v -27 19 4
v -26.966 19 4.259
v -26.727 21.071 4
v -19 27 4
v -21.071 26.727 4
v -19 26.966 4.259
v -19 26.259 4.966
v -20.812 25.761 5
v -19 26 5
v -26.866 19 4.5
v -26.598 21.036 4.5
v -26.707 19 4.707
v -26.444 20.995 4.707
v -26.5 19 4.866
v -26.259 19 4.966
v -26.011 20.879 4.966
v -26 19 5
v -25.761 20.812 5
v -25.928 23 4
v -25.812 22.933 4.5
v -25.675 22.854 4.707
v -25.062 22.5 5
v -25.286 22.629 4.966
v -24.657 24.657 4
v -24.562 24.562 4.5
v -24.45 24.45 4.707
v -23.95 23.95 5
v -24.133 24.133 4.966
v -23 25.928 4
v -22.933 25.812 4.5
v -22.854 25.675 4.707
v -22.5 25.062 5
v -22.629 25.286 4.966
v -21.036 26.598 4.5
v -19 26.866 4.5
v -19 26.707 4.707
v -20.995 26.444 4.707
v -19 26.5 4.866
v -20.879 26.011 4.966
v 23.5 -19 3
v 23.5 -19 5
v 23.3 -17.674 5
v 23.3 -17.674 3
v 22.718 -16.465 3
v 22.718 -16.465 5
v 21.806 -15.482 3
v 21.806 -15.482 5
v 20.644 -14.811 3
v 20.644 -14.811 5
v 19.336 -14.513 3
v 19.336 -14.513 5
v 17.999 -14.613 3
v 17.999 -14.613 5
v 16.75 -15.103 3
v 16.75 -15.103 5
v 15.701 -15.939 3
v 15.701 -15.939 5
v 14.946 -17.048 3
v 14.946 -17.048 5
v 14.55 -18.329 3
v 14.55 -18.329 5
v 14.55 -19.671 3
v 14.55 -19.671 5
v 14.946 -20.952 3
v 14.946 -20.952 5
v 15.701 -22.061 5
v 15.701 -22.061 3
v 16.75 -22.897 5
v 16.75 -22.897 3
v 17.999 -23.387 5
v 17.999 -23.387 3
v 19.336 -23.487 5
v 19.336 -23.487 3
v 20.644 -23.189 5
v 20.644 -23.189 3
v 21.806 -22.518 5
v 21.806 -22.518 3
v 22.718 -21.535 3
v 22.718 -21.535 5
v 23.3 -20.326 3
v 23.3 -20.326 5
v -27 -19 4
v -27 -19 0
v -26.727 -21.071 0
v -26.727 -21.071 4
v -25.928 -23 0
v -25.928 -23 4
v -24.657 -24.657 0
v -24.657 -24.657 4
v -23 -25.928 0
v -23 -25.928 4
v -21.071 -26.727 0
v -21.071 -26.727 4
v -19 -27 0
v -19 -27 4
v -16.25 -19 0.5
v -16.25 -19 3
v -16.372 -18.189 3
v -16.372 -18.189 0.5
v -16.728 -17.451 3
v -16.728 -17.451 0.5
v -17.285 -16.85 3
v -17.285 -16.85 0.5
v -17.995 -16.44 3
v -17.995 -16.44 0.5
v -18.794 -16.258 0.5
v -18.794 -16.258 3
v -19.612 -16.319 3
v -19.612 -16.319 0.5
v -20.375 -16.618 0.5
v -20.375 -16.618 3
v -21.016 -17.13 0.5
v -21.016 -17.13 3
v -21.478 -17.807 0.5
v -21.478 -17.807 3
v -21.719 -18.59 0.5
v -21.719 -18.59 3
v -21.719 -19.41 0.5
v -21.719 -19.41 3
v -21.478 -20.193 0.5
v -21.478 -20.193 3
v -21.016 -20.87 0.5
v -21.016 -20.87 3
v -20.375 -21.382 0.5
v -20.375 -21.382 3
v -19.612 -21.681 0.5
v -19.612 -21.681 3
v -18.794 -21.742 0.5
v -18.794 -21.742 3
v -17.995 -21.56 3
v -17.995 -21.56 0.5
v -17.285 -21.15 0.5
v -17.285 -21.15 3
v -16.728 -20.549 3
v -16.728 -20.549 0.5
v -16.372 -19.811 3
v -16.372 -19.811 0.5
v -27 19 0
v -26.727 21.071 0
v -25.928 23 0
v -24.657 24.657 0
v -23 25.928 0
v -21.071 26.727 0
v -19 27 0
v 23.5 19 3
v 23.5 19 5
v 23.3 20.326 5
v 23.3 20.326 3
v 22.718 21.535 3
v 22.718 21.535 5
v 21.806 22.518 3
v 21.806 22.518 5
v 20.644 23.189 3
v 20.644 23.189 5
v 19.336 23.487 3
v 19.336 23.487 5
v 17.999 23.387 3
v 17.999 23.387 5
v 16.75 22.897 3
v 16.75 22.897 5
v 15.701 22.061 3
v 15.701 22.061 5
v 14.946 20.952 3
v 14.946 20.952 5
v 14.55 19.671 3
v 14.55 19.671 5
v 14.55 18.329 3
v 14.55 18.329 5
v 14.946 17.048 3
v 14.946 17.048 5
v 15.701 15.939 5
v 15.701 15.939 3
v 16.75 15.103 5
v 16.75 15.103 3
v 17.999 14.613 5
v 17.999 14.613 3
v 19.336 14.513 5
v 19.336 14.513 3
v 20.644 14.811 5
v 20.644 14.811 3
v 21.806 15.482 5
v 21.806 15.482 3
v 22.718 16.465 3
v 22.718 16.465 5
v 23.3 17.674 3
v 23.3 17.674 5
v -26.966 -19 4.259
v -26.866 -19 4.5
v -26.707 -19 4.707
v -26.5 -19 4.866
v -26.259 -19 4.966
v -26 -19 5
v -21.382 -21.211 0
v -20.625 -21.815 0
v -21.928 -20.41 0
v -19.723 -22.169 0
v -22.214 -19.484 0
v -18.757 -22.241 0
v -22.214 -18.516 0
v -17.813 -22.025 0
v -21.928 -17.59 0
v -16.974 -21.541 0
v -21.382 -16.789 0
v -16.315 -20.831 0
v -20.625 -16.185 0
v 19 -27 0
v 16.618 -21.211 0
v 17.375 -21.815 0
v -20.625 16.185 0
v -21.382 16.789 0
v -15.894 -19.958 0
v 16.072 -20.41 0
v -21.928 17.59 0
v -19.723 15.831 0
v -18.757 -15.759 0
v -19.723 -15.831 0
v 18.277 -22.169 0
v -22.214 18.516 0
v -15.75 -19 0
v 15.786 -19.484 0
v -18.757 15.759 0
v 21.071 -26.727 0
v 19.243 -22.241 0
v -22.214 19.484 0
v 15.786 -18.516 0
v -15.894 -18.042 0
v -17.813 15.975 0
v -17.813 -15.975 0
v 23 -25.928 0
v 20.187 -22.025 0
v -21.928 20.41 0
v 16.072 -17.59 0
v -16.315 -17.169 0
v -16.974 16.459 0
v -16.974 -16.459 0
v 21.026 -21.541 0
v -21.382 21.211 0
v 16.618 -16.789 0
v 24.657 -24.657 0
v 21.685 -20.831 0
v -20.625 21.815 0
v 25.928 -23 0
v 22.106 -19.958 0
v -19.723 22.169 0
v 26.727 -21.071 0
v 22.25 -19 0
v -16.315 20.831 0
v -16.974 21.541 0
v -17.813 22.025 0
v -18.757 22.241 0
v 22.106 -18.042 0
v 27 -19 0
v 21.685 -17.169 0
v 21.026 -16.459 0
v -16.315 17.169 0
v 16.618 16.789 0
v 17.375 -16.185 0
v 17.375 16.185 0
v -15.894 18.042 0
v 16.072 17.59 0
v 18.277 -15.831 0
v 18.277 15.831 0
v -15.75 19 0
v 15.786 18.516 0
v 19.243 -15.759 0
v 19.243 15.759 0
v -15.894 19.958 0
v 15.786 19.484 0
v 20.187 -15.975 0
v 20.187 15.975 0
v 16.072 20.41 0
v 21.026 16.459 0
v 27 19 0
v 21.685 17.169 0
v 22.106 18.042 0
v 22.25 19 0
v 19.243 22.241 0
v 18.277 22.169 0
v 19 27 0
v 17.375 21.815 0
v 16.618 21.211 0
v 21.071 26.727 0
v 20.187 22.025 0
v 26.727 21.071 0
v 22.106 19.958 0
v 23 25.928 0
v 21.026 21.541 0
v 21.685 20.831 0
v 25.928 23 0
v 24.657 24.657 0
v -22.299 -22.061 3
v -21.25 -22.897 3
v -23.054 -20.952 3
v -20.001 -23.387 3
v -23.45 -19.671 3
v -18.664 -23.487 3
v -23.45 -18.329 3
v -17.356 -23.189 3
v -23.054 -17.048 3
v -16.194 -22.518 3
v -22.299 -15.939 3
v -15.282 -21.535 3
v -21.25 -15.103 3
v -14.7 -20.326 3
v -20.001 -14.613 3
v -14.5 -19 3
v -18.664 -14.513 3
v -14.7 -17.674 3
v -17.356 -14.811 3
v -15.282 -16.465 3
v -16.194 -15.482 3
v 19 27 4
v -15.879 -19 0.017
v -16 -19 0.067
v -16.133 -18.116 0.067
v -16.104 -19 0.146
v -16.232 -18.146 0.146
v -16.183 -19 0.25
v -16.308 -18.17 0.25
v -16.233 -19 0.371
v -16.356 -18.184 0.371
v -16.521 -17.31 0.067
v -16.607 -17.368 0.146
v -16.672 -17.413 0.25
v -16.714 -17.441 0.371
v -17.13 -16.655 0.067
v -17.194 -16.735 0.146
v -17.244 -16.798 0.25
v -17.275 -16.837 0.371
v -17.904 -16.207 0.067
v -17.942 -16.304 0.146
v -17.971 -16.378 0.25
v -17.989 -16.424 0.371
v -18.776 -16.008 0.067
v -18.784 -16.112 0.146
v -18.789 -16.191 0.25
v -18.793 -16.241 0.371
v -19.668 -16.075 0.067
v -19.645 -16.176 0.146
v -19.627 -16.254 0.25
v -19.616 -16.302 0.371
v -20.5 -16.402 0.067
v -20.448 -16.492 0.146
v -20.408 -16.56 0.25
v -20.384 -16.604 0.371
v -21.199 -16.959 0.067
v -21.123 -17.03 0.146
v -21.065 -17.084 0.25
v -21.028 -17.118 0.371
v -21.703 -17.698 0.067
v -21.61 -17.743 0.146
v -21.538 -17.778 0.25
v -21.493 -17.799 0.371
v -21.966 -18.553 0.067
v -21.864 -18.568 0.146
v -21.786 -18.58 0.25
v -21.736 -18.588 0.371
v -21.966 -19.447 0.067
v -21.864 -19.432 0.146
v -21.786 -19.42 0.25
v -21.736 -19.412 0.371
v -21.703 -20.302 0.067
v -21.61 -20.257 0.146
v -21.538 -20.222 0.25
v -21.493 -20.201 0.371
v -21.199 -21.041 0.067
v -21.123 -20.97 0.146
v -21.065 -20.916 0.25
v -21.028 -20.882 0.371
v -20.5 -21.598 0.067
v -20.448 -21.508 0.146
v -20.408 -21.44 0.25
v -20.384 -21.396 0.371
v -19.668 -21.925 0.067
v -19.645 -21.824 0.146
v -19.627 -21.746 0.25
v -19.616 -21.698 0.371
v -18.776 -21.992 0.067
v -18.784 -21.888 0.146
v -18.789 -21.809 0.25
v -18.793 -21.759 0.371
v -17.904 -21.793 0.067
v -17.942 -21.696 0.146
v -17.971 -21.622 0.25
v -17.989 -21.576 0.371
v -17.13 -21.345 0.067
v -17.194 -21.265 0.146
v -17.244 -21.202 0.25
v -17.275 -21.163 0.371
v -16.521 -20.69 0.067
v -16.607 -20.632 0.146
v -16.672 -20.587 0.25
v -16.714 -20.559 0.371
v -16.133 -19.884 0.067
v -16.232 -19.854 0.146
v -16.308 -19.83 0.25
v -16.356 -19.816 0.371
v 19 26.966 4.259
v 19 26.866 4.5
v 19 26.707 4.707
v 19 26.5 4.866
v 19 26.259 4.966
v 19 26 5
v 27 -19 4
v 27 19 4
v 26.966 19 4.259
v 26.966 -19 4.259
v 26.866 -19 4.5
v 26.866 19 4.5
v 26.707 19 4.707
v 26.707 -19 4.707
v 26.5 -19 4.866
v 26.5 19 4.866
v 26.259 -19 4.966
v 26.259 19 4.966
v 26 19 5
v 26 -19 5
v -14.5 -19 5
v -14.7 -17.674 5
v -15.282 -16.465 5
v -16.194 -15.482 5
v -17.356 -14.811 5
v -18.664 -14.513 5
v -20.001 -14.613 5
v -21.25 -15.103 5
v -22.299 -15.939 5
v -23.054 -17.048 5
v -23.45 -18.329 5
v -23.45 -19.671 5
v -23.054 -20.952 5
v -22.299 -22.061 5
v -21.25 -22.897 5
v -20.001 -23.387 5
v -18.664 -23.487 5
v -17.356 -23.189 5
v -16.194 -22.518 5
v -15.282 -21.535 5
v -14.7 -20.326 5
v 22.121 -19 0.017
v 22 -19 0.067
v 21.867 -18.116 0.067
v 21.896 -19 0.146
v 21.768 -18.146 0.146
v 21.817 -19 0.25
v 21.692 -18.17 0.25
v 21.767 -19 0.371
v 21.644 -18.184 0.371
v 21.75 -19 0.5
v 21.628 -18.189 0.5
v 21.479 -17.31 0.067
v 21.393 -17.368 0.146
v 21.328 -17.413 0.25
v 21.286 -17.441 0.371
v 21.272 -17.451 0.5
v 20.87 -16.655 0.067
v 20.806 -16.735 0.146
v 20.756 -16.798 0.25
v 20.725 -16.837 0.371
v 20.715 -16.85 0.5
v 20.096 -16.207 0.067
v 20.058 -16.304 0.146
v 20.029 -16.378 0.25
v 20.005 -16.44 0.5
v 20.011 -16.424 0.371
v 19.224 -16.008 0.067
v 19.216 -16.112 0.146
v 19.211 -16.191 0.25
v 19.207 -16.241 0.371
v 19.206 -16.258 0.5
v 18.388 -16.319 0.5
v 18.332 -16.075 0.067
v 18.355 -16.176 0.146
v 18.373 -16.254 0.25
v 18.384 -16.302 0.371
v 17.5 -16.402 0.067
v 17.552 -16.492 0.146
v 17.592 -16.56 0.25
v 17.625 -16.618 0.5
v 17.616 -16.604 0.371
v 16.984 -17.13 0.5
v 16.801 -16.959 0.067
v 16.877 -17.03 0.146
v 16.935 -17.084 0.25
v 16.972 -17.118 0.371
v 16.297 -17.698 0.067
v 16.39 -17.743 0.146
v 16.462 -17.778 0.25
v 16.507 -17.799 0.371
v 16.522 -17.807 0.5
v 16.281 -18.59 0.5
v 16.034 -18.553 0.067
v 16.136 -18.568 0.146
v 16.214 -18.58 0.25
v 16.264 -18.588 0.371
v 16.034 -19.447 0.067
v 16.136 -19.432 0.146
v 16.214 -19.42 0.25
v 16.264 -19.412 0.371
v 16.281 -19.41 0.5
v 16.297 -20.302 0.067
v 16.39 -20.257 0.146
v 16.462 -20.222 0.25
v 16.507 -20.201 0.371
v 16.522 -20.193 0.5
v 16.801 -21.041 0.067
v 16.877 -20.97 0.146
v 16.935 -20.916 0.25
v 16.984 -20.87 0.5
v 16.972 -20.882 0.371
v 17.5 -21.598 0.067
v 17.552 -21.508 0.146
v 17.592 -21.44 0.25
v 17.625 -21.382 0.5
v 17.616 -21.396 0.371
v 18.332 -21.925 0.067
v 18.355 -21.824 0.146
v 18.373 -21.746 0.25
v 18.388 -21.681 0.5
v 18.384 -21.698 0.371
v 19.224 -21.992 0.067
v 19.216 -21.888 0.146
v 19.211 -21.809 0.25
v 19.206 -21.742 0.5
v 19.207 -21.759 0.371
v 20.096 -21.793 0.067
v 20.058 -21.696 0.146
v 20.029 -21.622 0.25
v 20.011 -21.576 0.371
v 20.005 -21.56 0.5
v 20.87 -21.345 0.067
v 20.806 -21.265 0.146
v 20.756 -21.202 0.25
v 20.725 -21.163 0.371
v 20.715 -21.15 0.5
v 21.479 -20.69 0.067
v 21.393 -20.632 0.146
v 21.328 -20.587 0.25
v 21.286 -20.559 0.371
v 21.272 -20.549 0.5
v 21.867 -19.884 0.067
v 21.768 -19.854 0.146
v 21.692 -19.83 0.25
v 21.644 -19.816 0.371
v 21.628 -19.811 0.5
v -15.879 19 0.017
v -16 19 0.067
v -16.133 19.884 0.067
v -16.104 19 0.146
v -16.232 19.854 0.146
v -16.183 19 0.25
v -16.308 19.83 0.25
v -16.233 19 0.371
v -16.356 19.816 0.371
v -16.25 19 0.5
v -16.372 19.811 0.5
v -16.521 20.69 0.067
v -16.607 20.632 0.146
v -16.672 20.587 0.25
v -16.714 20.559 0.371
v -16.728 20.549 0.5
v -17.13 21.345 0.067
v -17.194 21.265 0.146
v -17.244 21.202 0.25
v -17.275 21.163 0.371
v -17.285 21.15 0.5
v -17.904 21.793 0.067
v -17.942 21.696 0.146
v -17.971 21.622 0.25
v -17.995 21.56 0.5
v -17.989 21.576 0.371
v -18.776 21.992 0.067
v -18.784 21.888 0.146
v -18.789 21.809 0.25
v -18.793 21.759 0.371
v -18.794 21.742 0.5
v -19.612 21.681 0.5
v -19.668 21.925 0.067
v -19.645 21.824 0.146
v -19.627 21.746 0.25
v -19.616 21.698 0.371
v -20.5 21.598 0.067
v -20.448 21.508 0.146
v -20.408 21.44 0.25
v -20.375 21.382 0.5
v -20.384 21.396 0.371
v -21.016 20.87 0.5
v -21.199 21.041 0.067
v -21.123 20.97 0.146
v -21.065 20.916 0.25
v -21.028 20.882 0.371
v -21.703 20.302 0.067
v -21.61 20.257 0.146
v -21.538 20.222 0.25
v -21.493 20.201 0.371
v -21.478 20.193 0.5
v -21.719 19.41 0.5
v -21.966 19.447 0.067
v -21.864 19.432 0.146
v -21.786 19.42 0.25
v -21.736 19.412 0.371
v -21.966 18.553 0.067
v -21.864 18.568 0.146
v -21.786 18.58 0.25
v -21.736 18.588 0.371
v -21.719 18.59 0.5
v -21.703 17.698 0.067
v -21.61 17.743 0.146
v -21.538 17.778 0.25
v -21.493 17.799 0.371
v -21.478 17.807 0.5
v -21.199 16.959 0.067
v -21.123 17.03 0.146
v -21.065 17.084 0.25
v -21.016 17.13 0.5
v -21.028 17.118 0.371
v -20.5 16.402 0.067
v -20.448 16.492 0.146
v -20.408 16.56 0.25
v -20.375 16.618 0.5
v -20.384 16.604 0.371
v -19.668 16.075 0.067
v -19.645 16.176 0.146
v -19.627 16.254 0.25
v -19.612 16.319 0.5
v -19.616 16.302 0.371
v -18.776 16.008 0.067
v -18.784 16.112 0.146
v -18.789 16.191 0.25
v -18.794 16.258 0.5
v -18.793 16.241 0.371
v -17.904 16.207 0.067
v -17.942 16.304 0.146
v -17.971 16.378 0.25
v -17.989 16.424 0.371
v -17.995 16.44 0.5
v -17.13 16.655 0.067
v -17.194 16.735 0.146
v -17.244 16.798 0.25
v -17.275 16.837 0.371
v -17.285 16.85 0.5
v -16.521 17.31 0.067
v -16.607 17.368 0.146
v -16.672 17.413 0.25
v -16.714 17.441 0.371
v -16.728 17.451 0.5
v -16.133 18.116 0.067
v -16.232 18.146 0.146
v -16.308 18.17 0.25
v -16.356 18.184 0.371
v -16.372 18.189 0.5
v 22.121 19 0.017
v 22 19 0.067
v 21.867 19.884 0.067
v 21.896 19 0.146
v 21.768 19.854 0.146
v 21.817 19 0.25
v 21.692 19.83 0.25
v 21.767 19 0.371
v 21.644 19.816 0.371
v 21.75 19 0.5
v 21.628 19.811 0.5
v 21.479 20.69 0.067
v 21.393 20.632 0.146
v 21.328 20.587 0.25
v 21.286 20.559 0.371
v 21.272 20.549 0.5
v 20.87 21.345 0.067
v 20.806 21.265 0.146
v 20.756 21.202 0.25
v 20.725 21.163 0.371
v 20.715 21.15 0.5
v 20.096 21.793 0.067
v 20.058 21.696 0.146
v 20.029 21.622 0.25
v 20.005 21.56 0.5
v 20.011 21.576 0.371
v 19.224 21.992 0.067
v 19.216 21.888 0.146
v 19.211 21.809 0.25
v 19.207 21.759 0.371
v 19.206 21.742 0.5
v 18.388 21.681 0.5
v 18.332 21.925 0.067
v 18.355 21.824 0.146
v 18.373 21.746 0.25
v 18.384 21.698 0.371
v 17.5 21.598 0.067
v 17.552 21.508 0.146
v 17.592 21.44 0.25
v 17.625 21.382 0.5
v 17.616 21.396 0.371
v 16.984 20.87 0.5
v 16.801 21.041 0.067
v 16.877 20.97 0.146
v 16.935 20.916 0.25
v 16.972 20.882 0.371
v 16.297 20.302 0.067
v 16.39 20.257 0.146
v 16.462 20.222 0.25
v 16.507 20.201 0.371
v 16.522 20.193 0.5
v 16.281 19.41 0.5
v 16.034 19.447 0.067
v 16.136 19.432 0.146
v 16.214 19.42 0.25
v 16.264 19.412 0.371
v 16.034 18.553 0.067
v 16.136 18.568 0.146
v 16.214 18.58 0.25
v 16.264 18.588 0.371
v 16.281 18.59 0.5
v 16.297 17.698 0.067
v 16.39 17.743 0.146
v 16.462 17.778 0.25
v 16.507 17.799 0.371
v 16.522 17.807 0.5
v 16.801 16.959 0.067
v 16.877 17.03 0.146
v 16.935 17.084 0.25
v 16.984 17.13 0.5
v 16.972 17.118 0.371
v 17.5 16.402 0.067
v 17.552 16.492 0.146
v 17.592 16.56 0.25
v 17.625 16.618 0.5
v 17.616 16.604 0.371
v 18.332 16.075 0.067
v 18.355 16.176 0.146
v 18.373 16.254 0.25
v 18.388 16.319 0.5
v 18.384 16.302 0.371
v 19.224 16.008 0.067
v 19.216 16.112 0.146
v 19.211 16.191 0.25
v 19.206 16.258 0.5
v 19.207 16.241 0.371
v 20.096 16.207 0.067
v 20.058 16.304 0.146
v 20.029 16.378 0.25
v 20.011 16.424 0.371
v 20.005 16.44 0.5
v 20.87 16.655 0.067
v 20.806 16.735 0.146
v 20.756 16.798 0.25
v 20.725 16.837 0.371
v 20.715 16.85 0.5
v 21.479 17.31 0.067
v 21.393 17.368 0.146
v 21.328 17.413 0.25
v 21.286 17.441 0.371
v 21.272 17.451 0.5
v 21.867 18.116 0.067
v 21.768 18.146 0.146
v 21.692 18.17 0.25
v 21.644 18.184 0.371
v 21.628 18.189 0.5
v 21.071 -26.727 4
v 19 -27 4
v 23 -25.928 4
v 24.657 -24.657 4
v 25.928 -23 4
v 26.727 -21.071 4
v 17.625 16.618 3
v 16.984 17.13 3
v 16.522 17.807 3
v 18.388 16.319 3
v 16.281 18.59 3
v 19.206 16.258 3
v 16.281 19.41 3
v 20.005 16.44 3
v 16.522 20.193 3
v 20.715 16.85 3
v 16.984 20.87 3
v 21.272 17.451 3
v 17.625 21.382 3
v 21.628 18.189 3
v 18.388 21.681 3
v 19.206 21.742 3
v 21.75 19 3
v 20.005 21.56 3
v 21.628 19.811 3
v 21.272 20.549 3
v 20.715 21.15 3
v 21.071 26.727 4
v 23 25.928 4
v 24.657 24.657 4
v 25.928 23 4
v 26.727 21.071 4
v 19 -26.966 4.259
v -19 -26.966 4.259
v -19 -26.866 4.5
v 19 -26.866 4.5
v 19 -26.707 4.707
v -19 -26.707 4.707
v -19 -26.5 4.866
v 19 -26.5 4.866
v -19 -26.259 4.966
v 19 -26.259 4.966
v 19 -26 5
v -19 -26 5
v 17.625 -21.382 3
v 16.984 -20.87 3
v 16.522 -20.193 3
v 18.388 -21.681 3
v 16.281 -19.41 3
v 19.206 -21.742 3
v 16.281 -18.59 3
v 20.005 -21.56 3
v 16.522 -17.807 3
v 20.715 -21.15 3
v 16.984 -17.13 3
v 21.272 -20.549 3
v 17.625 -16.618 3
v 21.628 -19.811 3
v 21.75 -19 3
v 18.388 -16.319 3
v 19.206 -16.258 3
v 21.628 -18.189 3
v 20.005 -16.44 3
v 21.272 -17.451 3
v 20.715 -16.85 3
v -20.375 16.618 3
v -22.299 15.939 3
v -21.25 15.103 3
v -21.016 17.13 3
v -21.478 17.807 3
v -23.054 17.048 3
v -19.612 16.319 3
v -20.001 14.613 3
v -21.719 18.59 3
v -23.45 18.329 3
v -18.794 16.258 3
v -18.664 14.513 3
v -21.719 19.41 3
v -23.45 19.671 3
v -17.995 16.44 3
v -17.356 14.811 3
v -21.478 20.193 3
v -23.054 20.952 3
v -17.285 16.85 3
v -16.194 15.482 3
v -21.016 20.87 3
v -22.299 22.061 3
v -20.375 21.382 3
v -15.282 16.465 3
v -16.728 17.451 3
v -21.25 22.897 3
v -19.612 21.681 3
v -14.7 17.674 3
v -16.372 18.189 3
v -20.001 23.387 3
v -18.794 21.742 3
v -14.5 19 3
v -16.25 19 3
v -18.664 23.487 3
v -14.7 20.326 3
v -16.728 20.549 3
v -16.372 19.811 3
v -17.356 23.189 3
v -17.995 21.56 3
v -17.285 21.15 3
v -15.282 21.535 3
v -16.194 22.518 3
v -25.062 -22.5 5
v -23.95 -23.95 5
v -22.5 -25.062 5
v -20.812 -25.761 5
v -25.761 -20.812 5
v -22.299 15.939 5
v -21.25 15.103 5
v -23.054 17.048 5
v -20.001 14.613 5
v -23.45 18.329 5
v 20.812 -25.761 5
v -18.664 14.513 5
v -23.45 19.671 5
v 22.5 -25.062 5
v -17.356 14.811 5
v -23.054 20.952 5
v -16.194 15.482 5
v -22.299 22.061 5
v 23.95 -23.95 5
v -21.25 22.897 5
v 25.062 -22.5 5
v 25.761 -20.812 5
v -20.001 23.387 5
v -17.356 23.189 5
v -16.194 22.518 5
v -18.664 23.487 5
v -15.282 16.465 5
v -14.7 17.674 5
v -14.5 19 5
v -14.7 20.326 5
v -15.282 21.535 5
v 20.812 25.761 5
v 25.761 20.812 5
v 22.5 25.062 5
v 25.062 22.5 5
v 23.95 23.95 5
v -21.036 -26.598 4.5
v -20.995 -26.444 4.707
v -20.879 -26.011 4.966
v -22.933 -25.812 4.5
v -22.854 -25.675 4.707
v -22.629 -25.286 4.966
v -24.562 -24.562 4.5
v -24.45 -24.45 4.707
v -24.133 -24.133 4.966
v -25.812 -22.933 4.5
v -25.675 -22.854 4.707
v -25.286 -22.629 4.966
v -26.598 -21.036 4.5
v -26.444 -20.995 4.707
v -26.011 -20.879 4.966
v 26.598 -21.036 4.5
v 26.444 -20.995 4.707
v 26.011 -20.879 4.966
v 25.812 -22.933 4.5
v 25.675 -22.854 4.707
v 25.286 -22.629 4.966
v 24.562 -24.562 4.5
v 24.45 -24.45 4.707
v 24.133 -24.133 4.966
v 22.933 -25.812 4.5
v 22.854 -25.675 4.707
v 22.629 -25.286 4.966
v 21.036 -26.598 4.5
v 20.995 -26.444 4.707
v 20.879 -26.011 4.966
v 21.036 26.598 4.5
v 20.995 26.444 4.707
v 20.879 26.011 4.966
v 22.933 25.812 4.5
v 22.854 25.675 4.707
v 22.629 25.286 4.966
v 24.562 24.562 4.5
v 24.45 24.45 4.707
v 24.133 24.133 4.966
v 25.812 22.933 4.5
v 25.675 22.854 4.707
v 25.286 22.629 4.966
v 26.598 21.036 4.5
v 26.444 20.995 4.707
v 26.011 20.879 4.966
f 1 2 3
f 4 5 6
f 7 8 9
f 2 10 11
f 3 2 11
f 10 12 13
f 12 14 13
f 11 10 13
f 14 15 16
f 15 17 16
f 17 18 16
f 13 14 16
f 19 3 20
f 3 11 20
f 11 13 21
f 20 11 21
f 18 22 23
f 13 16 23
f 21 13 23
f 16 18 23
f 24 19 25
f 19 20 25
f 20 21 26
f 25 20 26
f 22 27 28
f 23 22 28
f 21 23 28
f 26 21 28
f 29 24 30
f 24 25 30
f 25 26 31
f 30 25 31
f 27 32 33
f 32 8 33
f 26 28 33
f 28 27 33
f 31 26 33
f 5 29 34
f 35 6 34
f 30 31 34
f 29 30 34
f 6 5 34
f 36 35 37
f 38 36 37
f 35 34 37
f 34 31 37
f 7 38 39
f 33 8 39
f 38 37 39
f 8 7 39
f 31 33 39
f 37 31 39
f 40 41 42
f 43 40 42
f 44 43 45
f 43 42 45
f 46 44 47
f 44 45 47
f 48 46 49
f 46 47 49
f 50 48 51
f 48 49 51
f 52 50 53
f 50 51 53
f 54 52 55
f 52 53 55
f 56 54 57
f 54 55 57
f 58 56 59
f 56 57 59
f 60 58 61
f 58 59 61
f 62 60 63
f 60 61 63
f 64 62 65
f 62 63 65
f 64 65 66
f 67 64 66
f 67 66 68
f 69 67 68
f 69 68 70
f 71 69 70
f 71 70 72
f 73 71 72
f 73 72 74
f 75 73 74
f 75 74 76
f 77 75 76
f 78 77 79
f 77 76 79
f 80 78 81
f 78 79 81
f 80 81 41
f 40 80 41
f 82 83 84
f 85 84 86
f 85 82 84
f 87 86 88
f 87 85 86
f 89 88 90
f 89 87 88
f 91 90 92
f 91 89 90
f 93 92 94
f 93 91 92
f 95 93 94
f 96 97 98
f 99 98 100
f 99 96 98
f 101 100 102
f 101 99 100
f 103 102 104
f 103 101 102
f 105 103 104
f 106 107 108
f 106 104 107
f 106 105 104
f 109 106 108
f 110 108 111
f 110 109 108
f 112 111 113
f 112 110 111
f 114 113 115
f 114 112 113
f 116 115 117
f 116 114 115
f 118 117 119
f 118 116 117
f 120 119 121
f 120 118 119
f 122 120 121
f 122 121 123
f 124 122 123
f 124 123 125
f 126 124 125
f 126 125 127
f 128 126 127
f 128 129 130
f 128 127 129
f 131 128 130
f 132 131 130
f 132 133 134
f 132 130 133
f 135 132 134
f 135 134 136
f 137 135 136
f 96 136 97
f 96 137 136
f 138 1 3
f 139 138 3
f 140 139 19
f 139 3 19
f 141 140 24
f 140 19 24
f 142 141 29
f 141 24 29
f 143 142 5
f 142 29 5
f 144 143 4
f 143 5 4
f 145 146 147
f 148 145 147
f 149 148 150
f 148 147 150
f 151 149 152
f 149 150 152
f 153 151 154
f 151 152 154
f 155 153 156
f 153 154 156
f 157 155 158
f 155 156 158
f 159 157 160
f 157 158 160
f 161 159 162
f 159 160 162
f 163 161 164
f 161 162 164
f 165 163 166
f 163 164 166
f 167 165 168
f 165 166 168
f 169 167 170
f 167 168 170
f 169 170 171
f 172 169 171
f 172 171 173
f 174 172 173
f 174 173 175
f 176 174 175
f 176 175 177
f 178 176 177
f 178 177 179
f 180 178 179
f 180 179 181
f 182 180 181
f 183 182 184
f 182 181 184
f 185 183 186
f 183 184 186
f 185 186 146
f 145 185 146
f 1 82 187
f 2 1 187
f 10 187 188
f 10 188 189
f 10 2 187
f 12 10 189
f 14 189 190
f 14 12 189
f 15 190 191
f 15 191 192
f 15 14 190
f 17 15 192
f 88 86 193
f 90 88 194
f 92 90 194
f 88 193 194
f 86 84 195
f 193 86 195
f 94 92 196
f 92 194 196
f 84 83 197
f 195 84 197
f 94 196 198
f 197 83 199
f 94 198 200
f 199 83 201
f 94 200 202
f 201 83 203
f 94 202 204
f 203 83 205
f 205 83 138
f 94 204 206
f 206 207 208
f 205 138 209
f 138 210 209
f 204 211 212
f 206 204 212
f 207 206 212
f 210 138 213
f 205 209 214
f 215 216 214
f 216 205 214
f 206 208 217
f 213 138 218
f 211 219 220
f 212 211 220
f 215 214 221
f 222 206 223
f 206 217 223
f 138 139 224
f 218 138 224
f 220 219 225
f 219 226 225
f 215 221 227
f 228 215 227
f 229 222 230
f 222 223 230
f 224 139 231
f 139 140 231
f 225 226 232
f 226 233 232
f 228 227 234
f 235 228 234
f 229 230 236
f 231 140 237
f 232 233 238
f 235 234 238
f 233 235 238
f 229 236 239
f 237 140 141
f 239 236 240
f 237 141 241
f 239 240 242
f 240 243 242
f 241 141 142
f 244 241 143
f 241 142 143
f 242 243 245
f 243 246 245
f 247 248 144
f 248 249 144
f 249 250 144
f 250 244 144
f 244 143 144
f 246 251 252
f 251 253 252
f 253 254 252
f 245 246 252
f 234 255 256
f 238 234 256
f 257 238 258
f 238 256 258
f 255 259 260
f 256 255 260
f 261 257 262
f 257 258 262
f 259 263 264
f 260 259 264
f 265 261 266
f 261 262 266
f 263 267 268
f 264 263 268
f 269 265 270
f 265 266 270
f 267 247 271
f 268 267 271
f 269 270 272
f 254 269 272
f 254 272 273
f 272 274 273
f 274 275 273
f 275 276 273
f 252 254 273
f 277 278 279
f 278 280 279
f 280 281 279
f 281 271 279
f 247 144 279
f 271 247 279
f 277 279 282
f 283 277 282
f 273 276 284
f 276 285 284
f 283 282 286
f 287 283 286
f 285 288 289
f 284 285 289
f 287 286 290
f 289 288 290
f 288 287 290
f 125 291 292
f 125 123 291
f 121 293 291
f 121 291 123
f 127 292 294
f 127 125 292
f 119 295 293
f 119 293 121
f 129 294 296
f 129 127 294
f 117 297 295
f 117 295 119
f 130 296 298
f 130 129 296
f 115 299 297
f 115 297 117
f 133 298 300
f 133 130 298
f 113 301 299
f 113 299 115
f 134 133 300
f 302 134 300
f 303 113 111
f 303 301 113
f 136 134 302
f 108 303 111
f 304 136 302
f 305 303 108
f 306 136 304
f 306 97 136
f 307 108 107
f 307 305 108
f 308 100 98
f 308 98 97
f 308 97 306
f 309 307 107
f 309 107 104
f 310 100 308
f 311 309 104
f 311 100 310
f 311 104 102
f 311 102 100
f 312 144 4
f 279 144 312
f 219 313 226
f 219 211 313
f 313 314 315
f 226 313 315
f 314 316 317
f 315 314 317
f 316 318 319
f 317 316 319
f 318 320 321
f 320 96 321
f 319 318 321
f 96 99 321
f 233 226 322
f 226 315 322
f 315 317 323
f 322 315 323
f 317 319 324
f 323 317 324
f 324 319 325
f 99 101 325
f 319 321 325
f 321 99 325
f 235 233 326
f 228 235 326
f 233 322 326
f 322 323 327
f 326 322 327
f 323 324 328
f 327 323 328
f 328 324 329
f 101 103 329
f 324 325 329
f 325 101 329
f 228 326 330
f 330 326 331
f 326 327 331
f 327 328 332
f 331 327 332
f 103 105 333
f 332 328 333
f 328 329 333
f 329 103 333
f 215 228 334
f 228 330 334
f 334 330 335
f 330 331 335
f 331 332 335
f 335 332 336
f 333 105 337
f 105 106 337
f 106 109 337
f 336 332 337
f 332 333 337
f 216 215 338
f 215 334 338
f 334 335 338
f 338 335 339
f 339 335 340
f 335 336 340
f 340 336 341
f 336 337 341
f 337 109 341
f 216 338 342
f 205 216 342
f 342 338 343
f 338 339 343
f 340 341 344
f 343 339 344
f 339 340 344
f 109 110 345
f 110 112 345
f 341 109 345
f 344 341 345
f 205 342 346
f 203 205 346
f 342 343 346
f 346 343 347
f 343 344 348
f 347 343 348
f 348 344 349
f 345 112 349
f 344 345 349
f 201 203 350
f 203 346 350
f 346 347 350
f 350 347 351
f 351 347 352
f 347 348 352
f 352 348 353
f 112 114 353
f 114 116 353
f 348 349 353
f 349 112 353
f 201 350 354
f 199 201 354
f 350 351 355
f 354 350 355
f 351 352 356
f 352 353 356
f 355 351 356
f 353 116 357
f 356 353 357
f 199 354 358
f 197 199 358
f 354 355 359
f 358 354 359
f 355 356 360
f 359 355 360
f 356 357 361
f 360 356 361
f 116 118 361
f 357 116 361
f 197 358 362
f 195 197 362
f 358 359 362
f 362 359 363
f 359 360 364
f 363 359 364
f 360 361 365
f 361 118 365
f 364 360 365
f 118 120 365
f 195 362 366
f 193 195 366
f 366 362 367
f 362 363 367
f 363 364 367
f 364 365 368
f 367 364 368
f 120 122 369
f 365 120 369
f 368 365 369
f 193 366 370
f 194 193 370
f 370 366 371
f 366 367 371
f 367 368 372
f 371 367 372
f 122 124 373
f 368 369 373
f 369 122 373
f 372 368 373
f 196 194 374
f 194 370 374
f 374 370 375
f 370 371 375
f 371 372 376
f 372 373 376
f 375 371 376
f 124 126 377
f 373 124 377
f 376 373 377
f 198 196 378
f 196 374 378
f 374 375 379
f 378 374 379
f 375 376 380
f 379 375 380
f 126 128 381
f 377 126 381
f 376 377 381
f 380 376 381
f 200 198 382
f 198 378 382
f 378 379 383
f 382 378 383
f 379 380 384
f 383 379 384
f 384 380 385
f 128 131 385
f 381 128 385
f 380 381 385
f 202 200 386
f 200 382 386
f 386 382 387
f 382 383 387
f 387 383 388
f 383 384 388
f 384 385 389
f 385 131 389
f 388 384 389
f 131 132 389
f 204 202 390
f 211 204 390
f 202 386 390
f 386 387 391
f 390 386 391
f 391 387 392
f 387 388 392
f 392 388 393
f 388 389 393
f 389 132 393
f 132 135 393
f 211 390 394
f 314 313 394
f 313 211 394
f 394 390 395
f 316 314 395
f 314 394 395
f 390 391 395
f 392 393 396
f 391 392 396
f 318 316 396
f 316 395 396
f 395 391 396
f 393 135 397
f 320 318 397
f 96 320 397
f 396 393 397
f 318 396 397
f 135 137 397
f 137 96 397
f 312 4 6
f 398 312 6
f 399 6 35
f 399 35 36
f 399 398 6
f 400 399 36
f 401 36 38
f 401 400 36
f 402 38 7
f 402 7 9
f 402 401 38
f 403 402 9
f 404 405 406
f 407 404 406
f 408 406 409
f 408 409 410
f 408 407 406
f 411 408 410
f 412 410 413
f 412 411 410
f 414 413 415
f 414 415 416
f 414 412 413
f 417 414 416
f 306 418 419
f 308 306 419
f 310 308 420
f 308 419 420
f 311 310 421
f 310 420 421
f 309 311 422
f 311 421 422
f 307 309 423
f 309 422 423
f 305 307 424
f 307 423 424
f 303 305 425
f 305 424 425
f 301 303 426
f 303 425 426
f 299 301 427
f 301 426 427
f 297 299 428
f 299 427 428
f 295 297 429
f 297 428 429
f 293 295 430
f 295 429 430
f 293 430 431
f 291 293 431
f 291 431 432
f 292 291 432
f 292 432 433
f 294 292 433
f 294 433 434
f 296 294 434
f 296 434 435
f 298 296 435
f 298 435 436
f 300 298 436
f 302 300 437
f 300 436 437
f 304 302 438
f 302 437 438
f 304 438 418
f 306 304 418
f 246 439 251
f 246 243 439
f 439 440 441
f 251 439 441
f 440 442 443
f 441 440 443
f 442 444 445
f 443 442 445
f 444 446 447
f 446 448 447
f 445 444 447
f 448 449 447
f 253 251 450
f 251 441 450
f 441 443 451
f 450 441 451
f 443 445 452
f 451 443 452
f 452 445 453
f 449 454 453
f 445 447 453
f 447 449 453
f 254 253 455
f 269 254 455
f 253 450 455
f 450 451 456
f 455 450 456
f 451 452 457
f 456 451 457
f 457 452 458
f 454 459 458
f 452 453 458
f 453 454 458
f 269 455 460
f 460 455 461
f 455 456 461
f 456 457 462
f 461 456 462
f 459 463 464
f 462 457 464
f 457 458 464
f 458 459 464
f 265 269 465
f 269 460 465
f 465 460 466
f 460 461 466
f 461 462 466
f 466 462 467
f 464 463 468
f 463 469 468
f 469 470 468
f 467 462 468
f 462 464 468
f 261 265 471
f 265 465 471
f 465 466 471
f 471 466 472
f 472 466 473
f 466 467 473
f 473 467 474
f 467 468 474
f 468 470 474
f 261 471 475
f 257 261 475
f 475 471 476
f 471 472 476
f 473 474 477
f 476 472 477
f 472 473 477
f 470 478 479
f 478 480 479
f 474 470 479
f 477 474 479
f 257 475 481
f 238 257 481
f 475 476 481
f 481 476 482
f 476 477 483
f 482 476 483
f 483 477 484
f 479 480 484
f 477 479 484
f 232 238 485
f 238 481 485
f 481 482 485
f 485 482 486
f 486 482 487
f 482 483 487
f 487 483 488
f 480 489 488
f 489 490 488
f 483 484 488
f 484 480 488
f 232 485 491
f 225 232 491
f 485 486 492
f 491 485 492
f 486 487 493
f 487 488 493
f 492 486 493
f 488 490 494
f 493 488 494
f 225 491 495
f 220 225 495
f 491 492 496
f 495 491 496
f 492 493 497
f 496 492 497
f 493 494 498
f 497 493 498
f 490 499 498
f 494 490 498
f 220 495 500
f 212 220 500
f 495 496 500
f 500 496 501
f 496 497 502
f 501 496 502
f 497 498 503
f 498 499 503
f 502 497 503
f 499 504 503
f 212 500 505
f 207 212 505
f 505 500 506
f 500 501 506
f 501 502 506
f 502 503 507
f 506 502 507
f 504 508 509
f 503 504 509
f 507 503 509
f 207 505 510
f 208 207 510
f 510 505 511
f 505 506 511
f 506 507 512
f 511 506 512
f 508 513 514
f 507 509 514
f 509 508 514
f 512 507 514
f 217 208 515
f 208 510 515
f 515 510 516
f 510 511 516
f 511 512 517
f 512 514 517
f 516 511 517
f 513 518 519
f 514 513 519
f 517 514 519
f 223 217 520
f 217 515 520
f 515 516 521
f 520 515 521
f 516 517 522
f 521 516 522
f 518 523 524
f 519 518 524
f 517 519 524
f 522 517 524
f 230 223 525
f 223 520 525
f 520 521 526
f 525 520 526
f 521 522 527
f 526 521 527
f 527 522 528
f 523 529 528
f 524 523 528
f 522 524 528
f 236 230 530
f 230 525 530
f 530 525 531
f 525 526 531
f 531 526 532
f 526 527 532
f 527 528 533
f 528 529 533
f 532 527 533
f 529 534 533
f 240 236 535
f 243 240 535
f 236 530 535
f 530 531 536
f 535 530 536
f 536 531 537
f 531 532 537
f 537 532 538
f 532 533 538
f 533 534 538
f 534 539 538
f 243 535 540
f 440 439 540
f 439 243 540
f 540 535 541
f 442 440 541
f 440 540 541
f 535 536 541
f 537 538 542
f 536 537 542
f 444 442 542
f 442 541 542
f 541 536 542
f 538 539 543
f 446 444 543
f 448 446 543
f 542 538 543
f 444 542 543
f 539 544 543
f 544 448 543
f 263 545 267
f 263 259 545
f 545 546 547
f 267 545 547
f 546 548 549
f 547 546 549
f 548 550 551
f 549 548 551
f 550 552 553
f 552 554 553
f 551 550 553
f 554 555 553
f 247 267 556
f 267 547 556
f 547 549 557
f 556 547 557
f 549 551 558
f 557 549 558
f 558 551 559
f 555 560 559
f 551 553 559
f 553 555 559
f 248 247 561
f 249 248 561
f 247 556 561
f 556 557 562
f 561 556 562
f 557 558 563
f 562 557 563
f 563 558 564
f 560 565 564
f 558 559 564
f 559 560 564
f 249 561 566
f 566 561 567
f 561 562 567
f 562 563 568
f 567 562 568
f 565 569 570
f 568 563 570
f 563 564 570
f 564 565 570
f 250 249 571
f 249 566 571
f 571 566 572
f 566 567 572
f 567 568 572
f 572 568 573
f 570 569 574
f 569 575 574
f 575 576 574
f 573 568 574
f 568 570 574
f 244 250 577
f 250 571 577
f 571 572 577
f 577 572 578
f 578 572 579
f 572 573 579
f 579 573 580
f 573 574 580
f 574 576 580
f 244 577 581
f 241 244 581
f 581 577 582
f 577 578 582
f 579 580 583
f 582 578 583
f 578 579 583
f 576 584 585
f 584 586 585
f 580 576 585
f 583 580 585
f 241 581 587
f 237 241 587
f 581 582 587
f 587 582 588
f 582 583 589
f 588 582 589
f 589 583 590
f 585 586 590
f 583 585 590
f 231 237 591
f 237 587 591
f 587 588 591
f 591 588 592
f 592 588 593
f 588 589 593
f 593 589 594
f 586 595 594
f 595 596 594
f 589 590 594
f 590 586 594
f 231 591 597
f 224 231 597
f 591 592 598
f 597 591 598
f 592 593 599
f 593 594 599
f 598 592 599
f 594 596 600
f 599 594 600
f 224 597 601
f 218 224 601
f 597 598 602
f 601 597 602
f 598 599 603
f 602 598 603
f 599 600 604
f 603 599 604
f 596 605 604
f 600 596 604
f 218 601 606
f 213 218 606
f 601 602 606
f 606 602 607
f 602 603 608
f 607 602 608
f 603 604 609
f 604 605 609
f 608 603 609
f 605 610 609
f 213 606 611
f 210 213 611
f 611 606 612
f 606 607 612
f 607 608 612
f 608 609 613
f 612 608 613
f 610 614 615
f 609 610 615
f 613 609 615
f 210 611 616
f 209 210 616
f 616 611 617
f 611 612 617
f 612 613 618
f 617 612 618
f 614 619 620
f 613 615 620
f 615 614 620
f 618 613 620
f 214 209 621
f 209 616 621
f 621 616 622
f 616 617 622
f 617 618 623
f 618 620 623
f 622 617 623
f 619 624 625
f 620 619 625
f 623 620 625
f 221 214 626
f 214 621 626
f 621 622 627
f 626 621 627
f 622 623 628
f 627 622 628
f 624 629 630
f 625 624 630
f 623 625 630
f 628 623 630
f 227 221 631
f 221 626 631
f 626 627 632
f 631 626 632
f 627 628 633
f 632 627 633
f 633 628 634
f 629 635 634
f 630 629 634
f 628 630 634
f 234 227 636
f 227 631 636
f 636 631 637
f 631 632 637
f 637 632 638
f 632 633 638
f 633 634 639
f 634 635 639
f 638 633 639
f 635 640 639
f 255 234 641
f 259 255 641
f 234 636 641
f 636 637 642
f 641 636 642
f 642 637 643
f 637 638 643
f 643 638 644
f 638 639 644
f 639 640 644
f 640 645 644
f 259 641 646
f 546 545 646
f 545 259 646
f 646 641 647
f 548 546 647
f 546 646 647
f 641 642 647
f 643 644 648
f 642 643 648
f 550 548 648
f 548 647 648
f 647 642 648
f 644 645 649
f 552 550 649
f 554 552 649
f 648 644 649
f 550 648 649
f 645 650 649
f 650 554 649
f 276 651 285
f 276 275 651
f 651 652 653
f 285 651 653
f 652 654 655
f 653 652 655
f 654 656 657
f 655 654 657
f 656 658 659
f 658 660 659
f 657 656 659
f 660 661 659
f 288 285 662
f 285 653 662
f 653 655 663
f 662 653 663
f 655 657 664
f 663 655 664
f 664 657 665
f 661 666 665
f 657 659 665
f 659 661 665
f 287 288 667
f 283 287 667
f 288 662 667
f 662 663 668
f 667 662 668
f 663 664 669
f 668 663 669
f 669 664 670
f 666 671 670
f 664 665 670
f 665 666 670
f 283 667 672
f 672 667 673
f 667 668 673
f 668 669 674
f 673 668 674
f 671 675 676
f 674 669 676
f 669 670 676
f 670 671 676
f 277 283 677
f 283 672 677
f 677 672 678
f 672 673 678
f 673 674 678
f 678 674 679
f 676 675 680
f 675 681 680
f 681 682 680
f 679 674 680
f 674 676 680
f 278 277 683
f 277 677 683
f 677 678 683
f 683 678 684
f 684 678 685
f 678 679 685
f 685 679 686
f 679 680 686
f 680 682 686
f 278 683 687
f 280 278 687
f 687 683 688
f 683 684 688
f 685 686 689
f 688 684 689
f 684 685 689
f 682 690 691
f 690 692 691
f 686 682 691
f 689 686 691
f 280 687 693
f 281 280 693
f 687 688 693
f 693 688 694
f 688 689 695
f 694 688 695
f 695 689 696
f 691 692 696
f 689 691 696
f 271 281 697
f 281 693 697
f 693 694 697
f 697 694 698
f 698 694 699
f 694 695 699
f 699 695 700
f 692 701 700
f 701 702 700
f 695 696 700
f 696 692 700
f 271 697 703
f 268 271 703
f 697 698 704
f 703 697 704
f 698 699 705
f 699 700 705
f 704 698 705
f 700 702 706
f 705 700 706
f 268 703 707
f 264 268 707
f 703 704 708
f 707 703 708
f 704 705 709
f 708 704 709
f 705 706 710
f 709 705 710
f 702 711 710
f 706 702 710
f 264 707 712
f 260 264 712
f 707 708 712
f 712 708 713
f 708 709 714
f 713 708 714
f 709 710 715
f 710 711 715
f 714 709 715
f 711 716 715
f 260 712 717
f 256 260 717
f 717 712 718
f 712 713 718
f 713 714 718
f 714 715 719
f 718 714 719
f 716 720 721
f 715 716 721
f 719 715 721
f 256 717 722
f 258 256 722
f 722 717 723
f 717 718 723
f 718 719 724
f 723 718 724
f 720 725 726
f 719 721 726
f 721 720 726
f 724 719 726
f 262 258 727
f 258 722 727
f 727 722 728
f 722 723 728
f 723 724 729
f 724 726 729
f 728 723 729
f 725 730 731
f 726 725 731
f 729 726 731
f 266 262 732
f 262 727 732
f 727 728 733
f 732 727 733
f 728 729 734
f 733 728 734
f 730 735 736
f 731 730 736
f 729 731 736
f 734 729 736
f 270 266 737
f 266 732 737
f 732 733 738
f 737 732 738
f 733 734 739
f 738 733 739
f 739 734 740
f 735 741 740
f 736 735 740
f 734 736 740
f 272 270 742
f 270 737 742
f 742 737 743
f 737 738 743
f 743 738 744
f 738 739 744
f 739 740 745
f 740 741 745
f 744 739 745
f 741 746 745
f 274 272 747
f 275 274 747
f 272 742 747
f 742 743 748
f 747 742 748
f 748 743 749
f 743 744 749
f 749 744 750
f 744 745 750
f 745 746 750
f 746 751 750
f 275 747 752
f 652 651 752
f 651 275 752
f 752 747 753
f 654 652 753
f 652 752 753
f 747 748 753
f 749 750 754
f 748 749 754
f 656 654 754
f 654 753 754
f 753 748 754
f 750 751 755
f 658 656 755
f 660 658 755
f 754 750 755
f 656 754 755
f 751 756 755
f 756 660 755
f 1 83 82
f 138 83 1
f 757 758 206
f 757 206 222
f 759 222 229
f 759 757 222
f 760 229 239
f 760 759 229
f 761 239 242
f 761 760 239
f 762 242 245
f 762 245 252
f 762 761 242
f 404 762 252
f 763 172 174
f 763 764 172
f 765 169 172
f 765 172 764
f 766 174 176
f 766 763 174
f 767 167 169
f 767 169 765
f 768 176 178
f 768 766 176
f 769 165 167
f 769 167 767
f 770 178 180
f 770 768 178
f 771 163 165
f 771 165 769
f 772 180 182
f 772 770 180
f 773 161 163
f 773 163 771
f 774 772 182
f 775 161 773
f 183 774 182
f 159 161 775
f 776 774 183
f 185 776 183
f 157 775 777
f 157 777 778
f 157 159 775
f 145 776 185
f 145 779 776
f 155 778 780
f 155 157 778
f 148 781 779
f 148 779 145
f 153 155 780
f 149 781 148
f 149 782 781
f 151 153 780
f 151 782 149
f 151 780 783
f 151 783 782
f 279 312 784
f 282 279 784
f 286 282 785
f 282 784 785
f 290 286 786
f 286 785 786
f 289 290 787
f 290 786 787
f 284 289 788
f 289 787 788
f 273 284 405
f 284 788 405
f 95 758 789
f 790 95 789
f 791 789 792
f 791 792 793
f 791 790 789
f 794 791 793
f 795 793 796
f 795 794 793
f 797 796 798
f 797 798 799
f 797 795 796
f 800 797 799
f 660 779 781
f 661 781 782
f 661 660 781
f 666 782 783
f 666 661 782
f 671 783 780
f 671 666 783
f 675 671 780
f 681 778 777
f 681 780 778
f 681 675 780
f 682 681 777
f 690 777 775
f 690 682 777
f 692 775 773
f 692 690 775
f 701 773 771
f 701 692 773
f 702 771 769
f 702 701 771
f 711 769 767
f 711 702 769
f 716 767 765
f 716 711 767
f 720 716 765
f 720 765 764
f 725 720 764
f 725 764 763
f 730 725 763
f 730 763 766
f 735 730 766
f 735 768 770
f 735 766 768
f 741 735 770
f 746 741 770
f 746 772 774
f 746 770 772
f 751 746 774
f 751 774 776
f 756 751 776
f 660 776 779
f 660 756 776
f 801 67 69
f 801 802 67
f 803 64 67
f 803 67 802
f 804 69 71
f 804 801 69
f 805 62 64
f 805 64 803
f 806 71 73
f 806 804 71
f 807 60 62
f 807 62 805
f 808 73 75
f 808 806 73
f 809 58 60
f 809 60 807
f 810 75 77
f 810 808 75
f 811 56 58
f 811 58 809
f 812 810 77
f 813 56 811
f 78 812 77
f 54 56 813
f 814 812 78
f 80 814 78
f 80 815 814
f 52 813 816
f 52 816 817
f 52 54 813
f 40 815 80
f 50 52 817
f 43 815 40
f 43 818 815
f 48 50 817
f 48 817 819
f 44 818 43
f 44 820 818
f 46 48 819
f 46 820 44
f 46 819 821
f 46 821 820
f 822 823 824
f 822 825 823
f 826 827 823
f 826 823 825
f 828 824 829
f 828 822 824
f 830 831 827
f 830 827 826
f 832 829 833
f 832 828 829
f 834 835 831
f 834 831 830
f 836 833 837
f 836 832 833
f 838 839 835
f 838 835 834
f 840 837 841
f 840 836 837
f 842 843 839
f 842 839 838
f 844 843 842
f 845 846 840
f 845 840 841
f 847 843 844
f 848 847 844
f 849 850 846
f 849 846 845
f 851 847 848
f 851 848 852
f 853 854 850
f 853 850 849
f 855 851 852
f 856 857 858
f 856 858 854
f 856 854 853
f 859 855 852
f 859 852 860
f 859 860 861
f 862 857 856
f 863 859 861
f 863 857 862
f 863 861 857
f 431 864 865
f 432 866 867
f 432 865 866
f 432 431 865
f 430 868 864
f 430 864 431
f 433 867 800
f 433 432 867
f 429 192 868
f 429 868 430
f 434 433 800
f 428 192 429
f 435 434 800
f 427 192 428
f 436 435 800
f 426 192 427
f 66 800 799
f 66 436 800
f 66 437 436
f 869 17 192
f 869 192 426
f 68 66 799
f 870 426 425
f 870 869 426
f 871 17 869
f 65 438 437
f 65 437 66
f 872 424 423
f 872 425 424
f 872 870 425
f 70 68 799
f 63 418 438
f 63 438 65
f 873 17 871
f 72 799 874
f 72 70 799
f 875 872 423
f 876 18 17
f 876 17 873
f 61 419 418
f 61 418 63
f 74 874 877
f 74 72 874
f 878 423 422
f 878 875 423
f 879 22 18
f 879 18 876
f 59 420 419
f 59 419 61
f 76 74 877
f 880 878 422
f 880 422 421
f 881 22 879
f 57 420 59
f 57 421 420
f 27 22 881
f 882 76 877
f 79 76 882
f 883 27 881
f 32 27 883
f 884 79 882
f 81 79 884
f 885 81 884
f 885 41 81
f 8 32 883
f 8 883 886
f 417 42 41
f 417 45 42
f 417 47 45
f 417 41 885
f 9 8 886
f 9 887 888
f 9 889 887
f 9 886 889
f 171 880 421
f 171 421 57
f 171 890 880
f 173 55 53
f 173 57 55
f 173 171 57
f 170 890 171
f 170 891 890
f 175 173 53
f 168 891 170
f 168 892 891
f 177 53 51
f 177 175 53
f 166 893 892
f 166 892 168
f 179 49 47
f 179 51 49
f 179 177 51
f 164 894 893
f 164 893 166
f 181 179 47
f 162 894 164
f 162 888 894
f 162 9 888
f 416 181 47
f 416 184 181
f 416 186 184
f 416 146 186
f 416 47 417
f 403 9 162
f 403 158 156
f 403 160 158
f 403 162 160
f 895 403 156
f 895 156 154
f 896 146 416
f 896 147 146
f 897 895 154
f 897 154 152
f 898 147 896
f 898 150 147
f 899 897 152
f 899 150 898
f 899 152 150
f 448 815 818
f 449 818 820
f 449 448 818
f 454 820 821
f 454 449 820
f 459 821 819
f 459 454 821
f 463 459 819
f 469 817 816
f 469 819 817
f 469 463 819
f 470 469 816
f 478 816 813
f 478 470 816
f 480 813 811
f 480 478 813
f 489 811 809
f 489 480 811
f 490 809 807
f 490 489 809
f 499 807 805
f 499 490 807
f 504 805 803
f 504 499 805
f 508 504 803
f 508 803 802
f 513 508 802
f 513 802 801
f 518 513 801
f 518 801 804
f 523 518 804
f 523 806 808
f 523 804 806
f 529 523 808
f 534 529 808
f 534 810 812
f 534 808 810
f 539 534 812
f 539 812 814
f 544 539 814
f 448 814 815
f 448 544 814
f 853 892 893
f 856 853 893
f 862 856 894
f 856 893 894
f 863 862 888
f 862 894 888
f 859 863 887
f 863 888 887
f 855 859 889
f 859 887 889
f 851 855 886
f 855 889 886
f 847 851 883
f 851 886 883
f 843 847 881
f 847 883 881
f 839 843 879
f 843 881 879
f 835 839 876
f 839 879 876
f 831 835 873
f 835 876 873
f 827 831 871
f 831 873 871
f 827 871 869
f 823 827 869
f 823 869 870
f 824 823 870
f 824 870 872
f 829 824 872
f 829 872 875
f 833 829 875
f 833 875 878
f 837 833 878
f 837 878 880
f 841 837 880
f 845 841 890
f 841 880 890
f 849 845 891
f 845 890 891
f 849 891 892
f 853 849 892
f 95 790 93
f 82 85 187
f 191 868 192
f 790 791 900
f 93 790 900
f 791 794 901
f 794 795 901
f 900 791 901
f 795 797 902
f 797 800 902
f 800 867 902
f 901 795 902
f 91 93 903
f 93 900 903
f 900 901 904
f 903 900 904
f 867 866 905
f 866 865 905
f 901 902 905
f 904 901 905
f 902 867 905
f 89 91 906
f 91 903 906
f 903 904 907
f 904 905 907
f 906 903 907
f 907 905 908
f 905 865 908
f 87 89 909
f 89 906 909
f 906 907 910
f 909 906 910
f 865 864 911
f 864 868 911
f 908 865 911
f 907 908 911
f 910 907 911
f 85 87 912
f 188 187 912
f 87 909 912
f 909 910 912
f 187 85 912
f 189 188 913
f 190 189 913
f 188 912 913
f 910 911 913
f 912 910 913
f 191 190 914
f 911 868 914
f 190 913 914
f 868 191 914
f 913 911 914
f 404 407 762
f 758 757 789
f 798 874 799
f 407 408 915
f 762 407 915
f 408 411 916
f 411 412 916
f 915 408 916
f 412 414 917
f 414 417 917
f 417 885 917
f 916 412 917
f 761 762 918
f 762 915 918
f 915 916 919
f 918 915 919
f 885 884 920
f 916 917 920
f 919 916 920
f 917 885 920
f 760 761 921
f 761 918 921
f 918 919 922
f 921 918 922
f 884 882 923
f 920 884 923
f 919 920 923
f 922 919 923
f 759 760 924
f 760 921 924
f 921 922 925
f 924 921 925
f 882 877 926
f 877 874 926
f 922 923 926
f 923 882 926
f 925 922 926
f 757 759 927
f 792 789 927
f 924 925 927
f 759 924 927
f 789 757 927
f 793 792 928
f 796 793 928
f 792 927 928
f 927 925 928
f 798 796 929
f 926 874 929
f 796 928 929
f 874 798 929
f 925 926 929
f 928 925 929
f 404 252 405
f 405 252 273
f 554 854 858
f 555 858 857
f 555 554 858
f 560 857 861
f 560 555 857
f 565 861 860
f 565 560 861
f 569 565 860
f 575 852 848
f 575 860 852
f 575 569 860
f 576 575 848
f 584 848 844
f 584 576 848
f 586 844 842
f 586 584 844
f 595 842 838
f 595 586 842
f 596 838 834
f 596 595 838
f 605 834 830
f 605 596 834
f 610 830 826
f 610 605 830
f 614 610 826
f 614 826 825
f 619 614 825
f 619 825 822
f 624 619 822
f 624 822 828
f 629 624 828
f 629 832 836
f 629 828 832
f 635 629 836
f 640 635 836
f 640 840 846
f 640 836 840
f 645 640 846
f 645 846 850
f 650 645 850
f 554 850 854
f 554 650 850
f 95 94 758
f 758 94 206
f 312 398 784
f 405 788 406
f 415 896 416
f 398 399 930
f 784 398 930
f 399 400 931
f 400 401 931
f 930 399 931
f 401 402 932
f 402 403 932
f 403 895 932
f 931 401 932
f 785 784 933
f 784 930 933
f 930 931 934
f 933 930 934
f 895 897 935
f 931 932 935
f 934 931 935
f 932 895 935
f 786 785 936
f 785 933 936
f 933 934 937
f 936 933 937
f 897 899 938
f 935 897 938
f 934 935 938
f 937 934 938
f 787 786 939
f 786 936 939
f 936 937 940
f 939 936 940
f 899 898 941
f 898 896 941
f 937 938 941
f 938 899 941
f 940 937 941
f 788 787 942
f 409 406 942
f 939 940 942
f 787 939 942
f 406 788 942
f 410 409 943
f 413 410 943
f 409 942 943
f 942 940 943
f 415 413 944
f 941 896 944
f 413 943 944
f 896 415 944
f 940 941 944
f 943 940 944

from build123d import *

# Parameters (mm, degrees)
SKETCH1_W           = 54
SKETCH1_H           = 54
SKETCH1_R           = 2.75
BOSS_EXTRUDE1_DEPTH = 5
FILLET1_R           = 8
FILLET2_R           = 0.5
FILLET3_R           = 1
SKETCH2_R           = 4.5
CUT_EXTRUDE2_DEPTH  = 2


with BuildPart() as part:
    # Sketch1 → Boss-Extrude1 (new body)
    with BuildSketch(Plane.XY):
        Rectangle(SKETCH1_W, SKETCH1_H)
        with Locations((-19, 19)):
            Circle(SKETCH1_R, mode=Mode.SUBTRACT)
        with Locations((19, 19)):
            Circle(SKETCH1_R, mode=Mode.SUBTRACT)
        with Locations((19, -19)):
            Circle(SKETCH1_R, mode=Mode.SUBTRACT)
        with Locations((-19, -19)):
            Circle(SKETCH1_R, mode=Mode.SUBTRACT)
    extrude(amount=BOSS_EXTRUDE1_DEPTH)

    # Fillet1
    fillet1_edges = [part.edges().sort_by_distance(p)[0] for p in [
        (-27, 27, 2.5),
        (27, 27, 2.5),
        (27, -27, 2.5),
        (-27, -27, 2.5),
    ]]
    fillet(fillet1_edges, radius=FILLET1_R)

    # Fillet2
    fillet2_edges = [part.edges().sort_by_distance(p)[0] for p in [
        (-21.75, 19, 0),
        (-21.75, 19, 5),
        (16.25, 19, 0),
        (16.25, 19, 5),
        (16.25, -19, 0),
        (16.25, -19, 5),
        (-21.75, -19, 0),
        (-21.75, -19, 5),
    ]]
    fillet(fillet2_edges, radius=FILLET2_R)

    # Fillet3
    fillet3_edges = [part.edges().sort_by_distance(p)[0] for p in [
        (-27, 0, 5),
        (0, 27, 5),
        (0, -27, 5),
        (27, 0, 5),
        (24.656854249, 24.656854249, 5),
        (-24.656854249, -24.656854249, 5),
        (24.656854249, -24.656854249, 5),
        (-24.656854249, 24.656854249, 5),
    ]]
    fillet(fillet3_edges, radius=FILLET3_R)

    # Sketch2 → Cut-Extrude2 (cut)
    with BuildSketch(Plane.XY.offset(5)):
        with Locations((-19, 19)):
            Circle(SKETCH2_R)
        with Locations((19, 19)):
            Circle(SKETCH2_R)
        with Locations((19, -19)):
            Circle(SKETCH2_R)
        with Locations((-19, -19)):
            Circle(SKETCH2_R)
    extrude(amount=-CUT_EXTRUDE2_DEPTH, mode=Mode.SUBTRACT)


solid = part.part
